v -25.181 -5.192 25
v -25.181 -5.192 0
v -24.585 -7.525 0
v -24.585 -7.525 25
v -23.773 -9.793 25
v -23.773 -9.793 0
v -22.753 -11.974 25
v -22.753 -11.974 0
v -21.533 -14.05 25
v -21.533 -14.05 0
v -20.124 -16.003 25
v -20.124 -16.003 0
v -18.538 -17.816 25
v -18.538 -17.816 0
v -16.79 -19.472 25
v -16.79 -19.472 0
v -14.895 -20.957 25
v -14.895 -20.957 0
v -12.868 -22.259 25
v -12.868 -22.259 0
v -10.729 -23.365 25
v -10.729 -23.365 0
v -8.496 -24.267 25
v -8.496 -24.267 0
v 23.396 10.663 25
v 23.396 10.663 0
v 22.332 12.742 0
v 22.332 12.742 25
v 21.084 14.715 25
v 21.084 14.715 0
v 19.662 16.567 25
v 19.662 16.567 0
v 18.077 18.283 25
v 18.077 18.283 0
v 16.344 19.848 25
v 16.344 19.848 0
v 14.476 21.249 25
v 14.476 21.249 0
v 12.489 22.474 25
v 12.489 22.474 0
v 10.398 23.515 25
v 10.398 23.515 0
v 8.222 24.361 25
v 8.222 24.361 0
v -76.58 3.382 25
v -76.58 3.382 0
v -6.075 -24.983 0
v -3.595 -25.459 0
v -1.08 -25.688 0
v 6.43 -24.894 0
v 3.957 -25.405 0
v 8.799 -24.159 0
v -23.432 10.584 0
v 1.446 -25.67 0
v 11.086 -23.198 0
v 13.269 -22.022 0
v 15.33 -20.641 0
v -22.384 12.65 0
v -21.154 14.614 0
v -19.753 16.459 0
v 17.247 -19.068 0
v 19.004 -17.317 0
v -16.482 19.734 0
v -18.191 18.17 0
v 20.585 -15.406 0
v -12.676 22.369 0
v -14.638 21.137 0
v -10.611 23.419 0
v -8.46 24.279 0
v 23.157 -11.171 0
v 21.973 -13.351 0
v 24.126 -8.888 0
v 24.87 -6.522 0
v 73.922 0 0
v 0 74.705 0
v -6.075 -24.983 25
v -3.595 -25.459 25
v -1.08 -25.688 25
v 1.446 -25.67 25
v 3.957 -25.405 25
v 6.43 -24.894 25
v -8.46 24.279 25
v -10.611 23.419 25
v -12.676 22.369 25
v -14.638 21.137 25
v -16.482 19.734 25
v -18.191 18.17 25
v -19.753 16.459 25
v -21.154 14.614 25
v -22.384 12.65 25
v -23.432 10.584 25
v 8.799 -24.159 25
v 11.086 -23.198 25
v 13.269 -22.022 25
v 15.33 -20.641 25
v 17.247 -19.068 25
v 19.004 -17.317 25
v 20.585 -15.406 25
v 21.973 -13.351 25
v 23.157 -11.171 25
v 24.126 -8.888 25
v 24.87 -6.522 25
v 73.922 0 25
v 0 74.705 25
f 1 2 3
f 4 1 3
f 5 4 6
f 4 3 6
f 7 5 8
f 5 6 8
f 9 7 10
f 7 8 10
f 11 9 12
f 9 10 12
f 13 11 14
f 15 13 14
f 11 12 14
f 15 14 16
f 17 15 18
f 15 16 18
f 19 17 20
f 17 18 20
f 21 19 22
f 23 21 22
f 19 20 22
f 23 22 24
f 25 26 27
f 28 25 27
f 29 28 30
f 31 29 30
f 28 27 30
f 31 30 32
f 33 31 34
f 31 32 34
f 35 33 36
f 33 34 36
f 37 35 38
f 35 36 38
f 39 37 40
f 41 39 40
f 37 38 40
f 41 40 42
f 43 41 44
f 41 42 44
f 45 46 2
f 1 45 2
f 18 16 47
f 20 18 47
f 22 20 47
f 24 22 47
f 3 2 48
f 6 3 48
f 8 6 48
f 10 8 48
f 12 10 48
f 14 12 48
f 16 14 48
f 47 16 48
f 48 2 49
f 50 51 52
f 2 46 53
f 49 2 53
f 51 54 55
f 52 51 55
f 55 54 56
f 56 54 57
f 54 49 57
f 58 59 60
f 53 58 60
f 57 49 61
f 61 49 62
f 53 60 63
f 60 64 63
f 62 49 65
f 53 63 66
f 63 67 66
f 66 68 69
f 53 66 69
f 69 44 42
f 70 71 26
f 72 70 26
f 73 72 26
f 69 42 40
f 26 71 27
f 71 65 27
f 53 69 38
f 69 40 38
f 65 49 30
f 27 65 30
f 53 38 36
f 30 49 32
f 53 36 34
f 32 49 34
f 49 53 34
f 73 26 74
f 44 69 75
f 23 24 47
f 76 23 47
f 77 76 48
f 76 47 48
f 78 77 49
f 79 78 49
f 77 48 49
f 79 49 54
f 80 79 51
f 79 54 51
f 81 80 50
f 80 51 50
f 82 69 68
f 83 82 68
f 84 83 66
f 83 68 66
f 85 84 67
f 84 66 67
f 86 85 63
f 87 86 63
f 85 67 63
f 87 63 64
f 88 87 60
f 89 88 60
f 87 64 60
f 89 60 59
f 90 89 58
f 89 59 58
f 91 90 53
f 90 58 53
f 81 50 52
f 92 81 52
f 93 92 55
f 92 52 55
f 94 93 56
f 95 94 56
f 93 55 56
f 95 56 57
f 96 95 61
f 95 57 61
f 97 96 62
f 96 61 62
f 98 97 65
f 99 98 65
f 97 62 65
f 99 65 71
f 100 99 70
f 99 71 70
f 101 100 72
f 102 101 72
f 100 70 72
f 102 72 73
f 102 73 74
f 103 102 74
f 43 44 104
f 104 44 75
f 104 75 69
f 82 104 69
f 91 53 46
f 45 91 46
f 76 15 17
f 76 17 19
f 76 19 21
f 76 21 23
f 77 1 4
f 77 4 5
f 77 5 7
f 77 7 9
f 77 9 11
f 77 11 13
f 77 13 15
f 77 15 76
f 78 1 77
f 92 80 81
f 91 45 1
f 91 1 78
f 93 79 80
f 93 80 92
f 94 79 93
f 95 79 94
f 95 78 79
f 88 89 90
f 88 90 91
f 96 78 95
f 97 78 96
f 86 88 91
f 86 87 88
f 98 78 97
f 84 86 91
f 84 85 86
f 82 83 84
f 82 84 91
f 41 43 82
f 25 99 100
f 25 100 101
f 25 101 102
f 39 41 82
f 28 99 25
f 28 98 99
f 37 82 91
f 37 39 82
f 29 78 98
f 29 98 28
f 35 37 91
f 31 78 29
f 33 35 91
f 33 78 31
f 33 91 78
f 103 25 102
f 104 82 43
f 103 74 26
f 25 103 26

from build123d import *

# Parameters (mm, degrees)
F1_DEPTH = 25


with BuildPart() as f1:
    # F0 (on Top) → F1 (new body)
    with BuildSketch(Plane.XY):
        with BuildLine():
            ThreePointArc((24.8701038765, -6.5218529704), (25.4999256036, -3.2879214113), (25.7110216249, 0))
            ThreePointArc((25.7110216249, 0), (25.1255094172, 5.4557684631), (23.3956403104, 10.6630505701))
            ThreePointArc((23.3956403104, 10.6630505701), (17.2285716474, 19.0848880527), (8.2217665775, 24.3610177813))
            ThreePointArc((8.2217665775, 24.3610177813), (-0.1258474148, 25.7107136311), (-8.459848903, 24.2793655093))
            ThreePointArc((-8.459848903, 24.2793655093), (-17.3538464261, 18.9710476046), (-23.4315262789, 10.5839599978))
            ThreePointArc((-23.4315262789, 10.5839599978), (-25.5543270236, 2.8342553459), (-25.1812828872, -5.1922658973))
            ThreePointArc((-25.1812828872, -5.1922658973), (-19.3520995784, -16.9278727223), (-8.4963727751, -24.2666083881))
            ThreePointArc((-8.4963727751, -24.2666083881), (-1.0796944371, -25.6883415758), (6.430127649, -24.8939770108))
            ThreePointArc((6.430127649, -24.8939770108), (18.146896672, -18.2139170463), (24.8701038765, -6.5218529704))
        make_face()
        with BuildLine():
            ThreePointArc((23.3956403104, 10.6630505701), (25.1255094172, 5.4557684631), (25.7110216249, 0))
            ThreePointArc((25.7110216249, 0), (25.4999256036, -3.2879214113), (24.8701038765, -6.5218529704))
            Line((24.8701038765, -6.5218529704), (73.9221572876, 0))
            Line((73.9221572876, 0), (23.3956403104, 10.6630505701))
        make_face()
        with BuildLine():
            ThreePointArc((-8.459848903, 24.2793655093), (-0.1258474148, 25.7107136311), (8.2217665775, 24.3610177813))
            Line((8.2217665775, 24.3610177813), (0, 74.7051164508))
            Line((0, 74.7051164508), (-8.459848903, 24.2793655093))
        make_face()
        with BuildLine():
            ThreePointArc((-25.1812828872, -5.1922658973), (-25.5543270236, 2.8342553459), (-23.4315262789, 10.5839599978))
            Line((-23.4315262789, 10.5839599978), (-76.5798836946, 3.3824506681))
            Line((-76.5798836946, 3.3824506681), (-25.1812828872, -5.1922658973))
        make_face()
    extrude(amount=F1_DEPTH)


solid = f1.part
